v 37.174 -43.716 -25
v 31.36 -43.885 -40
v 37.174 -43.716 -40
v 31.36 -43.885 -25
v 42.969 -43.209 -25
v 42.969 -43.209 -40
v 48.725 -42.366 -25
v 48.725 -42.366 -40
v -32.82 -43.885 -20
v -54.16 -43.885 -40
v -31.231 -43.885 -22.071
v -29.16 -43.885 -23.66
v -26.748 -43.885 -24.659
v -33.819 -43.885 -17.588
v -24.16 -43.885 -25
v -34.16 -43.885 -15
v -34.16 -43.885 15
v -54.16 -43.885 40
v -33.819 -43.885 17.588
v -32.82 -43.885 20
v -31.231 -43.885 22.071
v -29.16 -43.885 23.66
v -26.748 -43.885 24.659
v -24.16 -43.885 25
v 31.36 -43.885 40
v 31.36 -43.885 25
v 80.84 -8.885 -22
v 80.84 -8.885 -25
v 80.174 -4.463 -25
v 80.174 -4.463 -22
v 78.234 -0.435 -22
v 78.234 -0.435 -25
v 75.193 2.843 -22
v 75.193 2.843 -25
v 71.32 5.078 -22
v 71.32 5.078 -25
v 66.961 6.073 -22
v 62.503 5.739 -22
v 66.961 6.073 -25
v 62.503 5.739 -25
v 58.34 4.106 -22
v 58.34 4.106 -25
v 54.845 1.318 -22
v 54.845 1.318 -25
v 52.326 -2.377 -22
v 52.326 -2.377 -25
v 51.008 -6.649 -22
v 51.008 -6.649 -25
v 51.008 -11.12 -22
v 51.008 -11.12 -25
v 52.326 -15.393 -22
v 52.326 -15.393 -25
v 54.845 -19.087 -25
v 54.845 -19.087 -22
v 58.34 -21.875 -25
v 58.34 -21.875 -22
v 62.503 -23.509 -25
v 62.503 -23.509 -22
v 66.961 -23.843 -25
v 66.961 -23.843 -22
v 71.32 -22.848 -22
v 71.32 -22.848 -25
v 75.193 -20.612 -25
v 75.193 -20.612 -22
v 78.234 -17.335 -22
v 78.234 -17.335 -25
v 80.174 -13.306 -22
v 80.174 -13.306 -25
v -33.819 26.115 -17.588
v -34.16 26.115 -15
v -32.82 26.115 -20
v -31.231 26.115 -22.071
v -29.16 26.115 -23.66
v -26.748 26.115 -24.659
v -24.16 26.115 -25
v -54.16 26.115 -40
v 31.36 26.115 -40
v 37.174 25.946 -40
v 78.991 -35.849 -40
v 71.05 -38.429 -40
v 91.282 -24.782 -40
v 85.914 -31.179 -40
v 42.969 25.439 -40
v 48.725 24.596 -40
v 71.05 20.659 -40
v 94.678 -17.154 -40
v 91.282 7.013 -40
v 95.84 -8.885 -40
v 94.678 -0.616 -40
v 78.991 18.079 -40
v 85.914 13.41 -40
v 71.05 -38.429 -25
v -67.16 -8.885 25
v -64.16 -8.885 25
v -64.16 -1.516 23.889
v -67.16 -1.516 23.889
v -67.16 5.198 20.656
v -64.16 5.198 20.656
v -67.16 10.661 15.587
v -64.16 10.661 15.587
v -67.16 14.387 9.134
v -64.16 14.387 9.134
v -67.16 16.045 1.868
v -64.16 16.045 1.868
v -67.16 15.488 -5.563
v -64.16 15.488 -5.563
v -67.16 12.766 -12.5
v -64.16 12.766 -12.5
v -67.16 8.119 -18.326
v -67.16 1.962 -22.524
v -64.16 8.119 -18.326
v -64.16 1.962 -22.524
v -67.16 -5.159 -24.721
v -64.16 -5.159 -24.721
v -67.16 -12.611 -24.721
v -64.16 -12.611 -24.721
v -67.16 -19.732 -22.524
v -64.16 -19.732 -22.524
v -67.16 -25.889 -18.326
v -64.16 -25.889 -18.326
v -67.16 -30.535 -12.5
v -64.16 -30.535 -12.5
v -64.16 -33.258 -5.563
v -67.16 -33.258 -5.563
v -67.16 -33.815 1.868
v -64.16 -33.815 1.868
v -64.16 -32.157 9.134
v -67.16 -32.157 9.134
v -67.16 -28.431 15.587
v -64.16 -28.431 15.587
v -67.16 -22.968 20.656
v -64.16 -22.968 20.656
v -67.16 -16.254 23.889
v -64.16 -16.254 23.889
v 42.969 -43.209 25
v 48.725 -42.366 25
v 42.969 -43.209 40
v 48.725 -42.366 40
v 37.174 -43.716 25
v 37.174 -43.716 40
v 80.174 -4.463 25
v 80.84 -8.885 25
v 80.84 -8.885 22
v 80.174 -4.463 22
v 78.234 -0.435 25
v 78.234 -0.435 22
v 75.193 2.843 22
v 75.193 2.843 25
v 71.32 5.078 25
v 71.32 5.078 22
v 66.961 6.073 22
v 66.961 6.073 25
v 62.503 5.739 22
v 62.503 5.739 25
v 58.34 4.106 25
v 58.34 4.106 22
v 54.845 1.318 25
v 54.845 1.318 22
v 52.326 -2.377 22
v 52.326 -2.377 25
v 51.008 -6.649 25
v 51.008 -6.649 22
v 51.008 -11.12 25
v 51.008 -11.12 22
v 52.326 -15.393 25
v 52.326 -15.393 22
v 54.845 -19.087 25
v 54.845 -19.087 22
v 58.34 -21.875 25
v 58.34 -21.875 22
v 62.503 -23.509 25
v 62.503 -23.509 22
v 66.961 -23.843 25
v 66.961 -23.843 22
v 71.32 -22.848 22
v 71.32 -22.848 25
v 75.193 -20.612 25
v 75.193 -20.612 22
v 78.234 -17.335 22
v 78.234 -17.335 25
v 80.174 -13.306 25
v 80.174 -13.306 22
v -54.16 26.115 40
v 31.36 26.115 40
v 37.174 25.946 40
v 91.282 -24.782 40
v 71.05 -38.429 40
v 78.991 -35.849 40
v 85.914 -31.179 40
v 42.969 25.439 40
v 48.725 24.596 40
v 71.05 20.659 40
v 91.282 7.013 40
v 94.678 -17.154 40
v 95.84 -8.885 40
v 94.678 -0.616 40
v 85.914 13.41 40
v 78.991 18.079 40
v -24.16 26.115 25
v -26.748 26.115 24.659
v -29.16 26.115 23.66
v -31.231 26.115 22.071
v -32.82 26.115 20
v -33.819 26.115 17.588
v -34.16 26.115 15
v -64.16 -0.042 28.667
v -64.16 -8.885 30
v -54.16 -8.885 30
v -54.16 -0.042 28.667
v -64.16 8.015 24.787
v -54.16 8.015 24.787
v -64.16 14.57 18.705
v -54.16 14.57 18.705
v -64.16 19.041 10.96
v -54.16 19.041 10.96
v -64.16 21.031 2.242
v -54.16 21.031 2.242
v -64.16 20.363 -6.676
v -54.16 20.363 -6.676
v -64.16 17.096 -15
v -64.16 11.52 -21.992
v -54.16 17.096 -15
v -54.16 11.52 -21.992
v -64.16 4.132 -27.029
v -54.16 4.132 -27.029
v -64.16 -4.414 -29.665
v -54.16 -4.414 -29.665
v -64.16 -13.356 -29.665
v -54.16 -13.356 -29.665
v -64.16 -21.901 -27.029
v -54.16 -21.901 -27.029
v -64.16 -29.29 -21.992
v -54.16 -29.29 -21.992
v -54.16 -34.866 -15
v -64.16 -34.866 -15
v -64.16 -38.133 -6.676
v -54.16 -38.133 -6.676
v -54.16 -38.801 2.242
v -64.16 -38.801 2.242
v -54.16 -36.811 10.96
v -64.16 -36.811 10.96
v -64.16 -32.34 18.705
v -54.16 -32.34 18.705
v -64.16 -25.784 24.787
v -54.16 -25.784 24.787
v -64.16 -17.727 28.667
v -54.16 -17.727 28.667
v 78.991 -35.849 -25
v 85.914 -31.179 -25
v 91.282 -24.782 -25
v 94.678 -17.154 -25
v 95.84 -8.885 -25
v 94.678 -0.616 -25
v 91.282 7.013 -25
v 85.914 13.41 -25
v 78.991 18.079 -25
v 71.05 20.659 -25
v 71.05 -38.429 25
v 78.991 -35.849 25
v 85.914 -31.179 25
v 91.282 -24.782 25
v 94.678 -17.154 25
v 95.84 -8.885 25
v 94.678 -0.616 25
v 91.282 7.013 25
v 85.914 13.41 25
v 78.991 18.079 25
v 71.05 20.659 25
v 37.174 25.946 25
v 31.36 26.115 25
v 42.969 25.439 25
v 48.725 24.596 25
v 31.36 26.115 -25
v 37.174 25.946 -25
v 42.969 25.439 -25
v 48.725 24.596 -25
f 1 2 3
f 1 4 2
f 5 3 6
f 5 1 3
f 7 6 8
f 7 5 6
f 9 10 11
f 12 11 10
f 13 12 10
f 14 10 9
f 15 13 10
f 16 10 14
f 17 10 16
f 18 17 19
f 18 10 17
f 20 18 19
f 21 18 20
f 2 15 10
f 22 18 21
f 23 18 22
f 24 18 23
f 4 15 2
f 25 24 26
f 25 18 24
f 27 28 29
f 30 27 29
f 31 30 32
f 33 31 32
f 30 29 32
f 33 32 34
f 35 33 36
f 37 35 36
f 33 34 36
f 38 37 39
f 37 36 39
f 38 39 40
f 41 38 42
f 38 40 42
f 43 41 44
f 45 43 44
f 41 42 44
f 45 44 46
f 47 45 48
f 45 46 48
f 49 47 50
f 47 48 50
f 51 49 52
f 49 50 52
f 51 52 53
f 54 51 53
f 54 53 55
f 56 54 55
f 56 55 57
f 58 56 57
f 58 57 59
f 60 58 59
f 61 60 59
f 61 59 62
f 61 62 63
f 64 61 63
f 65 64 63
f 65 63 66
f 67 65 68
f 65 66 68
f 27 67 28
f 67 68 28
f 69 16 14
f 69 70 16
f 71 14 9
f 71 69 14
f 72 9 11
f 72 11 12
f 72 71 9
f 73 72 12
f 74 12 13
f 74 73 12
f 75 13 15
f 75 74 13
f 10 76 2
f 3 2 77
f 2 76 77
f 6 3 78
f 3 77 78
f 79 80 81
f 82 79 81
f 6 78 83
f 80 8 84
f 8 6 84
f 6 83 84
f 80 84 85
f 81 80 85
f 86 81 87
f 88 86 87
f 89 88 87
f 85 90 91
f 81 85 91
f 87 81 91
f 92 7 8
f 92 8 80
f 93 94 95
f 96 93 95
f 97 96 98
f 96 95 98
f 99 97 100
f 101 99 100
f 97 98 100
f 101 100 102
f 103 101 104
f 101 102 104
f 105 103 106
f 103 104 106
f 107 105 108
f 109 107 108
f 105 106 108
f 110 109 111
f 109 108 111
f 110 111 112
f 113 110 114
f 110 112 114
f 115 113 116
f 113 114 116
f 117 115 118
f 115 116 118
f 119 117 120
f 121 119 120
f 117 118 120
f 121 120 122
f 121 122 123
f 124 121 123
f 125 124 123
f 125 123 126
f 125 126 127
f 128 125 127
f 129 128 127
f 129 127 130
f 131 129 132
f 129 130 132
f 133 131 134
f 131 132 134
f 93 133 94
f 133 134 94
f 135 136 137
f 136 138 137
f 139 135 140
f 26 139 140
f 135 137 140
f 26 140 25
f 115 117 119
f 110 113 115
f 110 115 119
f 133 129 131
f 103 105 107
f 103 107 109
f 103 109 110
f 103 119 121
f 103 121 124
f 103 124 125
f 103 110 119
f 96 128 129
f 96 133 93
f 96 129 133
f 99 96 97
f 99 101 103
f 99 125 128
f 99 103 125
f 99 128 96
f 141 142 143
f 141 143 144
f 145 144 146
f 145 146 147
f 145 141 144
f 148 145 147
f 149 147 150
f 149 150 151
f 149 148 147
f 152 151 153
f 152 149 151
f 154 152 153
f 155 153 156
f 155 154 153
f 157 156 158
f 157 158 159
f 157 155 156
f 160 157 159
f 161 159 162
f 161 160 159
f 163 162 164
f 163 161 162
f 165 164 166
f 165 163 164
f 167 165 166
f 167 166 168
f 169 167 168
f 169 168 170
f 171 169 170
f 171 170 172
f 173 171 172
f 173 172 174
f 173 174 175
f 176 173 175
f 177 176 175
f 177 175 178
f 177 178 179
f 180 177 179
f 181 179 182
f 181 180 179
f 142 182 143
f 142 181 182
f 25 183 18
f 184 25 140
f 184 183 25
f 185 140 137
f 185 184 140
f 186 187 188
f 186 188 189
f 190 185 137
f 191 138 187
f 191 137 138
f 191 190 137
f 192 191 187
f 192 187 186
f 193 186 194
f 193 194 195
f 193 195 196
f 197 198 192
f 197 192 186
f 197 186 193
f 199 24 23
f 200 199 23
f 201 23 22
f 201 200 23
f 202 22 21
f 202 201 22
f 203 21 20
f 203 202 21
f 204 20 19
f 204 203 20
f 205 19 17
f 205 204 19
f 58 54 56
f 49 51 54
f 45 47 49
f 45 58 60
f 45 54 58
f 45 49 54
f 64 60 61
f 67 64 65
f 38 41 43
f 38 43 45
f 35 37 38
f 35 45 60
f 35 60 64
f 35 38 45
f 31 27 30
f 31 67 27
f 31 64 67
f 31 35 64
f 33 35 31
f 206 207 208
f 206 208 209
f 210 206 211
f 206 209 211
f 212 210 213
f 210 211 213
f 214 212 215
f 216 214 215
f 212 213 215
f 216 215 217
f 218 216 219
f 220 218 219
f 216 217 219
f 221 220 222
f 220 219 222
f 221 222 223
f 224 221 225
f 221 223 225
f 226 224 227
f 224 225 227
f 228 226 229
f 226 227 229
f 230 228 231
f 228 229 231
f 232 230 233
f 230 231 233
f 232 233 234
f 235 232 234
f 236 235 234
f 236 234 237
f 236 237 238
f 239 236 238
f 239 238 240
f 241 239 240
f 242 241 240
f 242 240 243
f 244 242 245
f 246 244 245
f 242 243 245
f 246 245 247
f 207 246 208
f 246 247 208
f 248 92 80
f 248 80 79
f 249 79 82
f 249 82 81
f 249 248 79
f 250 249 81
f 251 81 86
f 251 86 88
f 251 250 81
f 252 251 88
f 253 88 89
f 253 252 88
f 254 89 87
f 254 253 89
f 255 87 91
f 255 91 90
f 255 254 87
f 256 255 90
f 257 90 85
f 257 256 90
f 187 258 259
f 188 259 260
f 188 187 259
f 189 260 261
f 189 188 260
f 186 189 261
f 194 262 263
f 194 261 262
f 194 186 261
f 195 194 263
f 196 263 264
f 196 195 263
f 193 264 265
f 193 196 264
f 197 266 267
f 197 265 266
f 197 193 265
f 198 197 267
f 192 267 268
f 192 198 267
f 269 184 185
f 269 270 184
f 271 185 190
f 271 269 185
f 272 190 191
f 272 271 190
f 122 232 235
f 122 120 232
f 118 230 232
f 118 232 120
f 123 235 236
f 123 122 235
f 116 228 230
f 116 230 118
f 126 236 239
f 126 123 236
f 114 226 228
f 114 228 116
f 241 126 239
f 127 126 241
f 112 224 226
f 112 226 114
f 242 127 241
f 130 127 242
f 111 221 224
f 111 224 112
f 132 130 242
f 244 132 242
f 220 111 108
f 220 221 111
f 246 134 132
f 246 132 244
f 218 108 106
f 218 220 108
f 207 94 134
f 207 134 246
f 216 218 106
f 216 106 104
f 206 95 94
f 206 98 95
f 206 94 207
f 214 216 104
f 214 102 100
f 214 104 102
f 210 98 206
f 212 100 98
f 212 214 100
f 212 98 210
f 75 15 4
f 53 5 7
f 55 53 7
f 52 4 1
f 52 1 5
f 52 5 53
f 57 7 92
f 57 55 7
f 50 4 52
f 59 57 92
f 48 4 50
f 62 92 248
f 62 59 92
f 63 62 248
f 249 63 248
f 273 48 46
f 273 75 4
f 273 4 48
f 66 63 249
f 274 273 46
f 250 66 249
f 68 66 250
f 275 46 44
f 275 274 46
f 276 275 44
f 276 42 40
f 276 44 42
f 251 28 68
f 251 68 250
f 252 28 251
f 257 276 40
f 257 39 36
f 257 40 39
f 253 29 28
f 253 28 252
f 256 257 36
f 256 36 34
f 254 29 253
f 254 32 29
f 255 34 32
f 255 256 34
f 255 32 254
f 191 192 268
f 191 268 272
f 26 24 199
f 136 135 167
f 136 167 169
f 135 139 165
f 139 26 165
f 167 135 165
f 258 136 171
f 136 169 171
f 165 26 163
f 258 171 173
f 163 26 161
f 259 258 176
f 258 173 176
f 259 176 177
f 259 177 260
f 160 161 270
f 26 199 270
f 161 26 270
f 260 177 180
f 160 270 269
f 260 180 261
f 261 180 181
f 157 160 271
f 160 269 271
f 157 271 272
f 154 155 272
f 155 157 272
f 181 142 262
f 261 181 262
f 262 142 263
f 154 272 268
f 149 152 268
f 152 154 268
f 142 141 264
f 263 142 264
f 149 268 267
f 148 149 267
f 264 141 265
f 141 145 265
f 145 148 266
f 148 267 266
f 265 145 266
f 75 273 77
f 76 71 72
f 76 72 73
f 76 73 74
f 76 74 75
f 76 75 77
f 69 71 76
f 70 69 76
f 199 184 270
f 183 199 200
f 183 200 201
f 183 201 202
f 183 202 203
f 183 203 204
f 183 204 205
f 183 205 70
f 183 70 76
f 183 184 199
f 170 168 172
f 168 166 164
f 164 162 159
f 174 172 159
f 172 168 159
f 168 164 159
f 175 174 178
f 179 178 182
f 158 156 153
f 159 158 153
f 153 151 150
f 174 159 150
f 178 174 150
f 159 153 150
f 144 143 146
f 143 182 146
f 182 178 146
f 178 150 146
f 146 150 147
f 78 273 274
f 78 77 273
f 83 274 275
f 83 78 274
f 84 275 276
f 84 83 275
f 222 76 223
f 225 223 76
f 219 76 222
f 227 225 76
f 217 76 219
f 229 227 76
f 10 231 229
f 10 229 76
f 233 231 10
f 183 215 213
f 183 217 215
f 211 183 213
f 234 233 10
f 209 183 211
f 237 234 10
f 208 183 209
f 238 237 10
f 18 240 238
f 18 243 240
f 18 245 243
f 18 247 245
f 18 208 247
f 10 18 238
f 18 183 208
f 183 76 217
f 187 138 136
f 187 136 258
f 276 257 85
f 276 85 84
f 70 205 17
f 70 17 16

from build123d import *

# Parameters (mm, degrees)
BOSS_EXTRUDE1_DEPTH = 40
SKETCH2_W           = 154.782746008
SKETCH2_H           = 50
CUT_EXTRUDE1_DEPTH  = 44.884825983
SKETCH2_2_W         = 154.782746008
SKETCH2_2_H         = 50
CUT_EXTRUDE2_DEPTH  = 27.115174017
SKETCH3_R           = 15
BOSS_EXTRUDE2_DEPTH = 3
SKETCH4_R           = 30
BOSS_EXTRUDE3_DEPTH = 10
SKETCH5_R           = 25
BOSS_EXTRUDE4_DEPTH = 3
FILLET1_R           = 100
FILLET2_R           = 100
FILLET3_R           = 10


with BuildPart() as part:
    # Sketch1 → Boss-Extrude1 (new body, symmetric)
    with BuildSketch(Plane.XY):
        with BuildLine():
            Line((-54.159677949, -43.884825983), (40.108572858, -43.884825983))
            Line((40.108572858, -43.884825983), (71.049767381, -38.429058573))
            ThreePointArc((71.049767381, -38.429058573), (95.840322051, -8.884825983), (71.049767381, 20.659406608))
            Line((71.049767381, 20.659406608), (40.108572858, 26.115174017))
            Line((40.108572858, 26.115174017), (-54.159677949, 26.115174017))
            Line((-54.159677949, 26.115174017), (-54.159677949, -43.884825983))
        make_face()
    extrude(amount=BOSS_EXTRUDE1_DEPTH, both=True)

    # Sketch2 → Cut-Extrude1 (cut, through all)
    with BuildSketch(Plane(origin=(0, 0, 0), x_dir=(1, 0, 0), z_dir=(0, 1, 0))):
        with Locations((43.231695055, 0)):
            Rectangle(SKETCH2_W, SKETCH2_H)
    extrude(amount=-CUT_EXTRUDE1_DEPTH, mode=Mode.SUBTRACT)

    # Sketch2<2> → Cut-Extrude2 (cut, through all)
    with BuildSketch(Plane(origin=(0, 0, 0), x_dir=(1, 0, 0), z_dir=(0, 1, 0))):
        with Locations((43.231695055, 0)):
            Rectangle(SKETCH2_2_W, SKETCH2_2_H)
    extrude(amount=CUT_EXTRUDE2_DEPTH, mode=Mode.SUBTRACT)

    # Sketch3 → Boss-Extrude2 (add)
    with BuildSketch(Plane.XY.offset(-25)):
        with Locations((65.840322051, -8.884825983)):
            Circle(SKETCH3_R)
    boss_extrude2 = extrude(amount=BOSS_EXTRUDE2_DEPTH)

    # Mirror1: Boss-Extrude2 across plane
    add(boss_extrude2.mirror(Plane.XY))

    # Sketch4 → Boss-Extrude3 (add)
    with BuildSketch(Plane.ZY.offset(54.159677949)):
        with Locations((0, -8.884825983)):
            Circle(SKETCH4_R)
    extrude(amount=BOSS_EXTRUDE3_DEPTH)

    # Sketch5 → Boss-Extrude4 (add)
    with BuildSketch(Plane.ZY.offset(64.159677949)):
        with Locations((0, -8.884825983)):
            Circle(SKETCH5_R)
    extrude(amount=BOSS_EXTRUDE4_DEPTH)

    # Fillet1
    fillet1_edges = [part.edges().sort_by_distance(p)[0] for p in [
        (40.108572858, 26.115174017, 32.5),
        (40.108572858, 26.115174017, -32.5),
    ]]
    fillet(fillet1_edges, radius=FILLET1_R)

    # Fillet2
    fillet2_edges = [part.edges().sort_by_distance(p)[0] for p in [
        (40.108572858, -43.884825983, 32.5),
        (40.108572858, -43.884825983, -32.5),
    ]]
    fillet(fillet2_edges, radius=FILLET2_R)

    # Fillet3
    fillet3_edges = [part.edges().sort_by_distance(p)[0] for p in [
        (-34.159677949, -8.884825983, -25),
        (-34.159677949, -8.884825983, 25),
    ]]
    fillet(fillet3_edges, radius=FILLET3_R)


solid = part.part
